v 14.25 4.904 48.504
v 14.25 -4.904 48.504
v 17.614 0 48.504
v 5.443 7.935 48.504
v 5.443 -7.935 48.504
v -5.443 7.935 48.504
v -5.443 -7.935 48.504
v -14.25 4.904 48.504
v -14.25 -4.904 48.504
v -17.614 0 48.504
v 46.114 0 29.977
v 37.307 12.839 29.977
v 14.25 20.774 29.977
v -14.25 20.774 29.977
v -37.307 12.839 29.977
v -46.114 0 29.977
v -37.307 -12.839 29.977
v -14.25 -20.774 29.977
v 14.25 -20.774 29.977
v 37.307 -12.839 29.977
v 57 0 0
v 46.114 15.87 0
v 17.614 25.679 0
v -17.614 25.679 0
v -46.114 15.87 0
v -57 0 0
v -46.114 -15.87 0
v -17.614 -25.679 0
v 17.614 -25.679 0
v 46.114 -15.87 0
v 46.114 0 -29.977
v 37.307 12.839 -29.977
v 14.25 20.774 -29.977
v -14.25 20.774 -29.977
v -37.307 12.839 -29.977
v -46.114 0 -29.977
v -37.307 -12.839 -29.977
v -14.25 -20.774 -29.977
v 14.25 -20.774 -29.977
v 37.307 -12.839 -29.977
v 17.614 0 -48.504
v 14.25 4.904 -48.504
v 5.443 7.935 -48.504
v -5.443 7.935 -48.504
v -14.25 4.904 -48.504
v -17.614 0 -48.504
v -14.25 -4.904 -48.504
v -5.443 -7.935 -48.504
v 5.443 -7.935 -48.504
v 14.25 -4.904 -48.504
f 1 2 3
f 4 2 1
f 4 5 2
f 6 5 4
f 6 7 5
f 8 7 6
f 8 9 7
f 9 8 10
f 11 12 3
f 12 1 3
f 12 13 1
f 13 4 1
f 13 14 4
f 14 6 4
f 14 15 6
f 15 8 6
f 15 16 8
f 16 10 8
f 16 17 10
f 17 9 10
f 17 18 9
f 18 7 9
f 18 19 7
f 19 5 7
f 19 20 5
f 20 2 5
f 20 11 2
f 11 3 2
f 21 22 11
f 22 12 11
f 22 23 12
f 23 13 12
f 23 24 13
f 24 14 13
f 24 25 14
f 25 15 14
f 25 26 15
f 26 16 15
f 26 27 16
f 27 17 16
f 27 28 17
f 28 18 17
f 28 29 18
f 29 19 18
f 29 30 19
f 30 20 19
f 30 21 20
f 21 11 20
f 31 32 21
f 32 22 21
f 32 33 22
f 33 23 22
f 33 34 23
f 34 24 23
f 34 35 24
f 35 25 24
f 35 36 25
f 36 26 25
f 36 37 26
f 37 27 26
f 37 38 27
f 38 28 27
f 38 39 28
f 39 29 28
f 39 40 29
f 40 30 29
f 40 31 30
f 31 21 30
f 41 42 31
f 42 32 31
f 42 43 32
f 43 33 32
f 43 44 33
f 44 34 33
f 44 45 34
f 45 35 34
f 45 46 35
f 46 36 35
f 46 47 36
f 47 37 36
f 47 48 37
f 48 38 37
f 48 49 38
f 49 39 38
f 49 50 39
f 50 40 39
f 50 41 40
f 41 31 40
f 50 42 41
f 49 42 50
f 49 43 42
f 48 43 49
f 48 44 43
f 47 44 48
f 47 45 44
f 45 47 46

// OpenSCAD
// Generated by SolidPython 1.0.1 on 2020-07-29 00:46:54


scale(v = [19, 9, 17]) {
	sphere(r = 3);
}
/***********************************************
*********      SolidPython code:      **********
************************************************
 
# import packages: SolidPython
from solid import *
from solid.utils import *
from itertools import chain, combinations, permutations


class Resize:

    def __init__(self, scad_file):
        self.scad_file = scad_file
        #self.scad_file = import_scad(scad_file)
        # cone/cylinder param:
        self.r1 = 0
        self.r2 = 0
        self.h = 0
        # rectangular prism param:
        self.w = 0
        self.l = 0
        # ellipse param:
        self.r = 0

    # import OpenScad code (file name corresponds to shape)


    # classify shape + parameters
    def assign(self, param1, param2, param3):
        if self.scad_file == 'cone.scad':
            self.r1 = param1
            self.r2 = param2
            self.h = param3
        elif self.scad_file == 'cylinder.scad':
            self.r1 = param1
            self.r2 = param2
            self.h = param3
        elif self.scad_file == 'rectangularPrism.scad':
            self.h = param1
            self.l = param2
            self.w = param3
        else:
            self.r = param1
            self.h = param2

    # resize parameters
    def iterate(self):
        x = range(3, 20, 2)
        i = 1
        if self.scad_file == 'cone.scad':
            tempList = list(permutations(x, 2))
            for temp in tempList:
                param1 = temp[0]
                param2 = temp[1]
                filepath = 'produced_scad_files/' + 'cone' + str(param1) + '_' + str(param2) + '_' + '.scad'
                scad_render_to_file(cylinder(h=param1, r1=param2, r2=0), filepath)

        elif self.scad_file == 'cylinder.scad':
            tempList = list(permutations(x, 3))
            for temp in tempList:
                param1 = temp[0]
                param2 = temp[1]
                filepath = 'produced_scad_files/' + 'cylinder' + str(param1) + '_' + str(param2) + '_' + '.scad'
                scad_render_to_file(cylinder(h=param1, r1=param2, r2=param2), filepath)

        elif self.scad_file == 'rectangularPrism.scad':
            tempList = list(permutations(x, 3))
            for temp in tempList:
                param1 = temp[0]
                param2 = temp[1]
                param3 = temp[2]
                filepath = 'produced_scad_files/' + 'rectangularPrism' + str(param1) + '_' + str(param2) + '_' + str(
                    param3) + '.scad'
                scad_render_to_file(cube(size=(param1, param2, param3)), filepath)

        elif self.scad_file == 'ellipse.scad':
            tempList = list(permutations(x, 4))
            for temp in tempList:
                param1 = temp[0]
                param2 = temp[1]
                param3 = temp[2]
                param4 = temp[3]
                filepath = 'produced_scad_files/' + 'ellipse' + str(param1) + '_' + str(param2) + '_' + str(param3) + '_' + str(param4) + '.scad'
                scad_render_to_file(scale([param1, param2, param3])(sphere(r=param4)), filepath)

    def render_to_scadfile(self):
        scad_render_to_file(scad, 'example.scad') 
 
************************************************/
